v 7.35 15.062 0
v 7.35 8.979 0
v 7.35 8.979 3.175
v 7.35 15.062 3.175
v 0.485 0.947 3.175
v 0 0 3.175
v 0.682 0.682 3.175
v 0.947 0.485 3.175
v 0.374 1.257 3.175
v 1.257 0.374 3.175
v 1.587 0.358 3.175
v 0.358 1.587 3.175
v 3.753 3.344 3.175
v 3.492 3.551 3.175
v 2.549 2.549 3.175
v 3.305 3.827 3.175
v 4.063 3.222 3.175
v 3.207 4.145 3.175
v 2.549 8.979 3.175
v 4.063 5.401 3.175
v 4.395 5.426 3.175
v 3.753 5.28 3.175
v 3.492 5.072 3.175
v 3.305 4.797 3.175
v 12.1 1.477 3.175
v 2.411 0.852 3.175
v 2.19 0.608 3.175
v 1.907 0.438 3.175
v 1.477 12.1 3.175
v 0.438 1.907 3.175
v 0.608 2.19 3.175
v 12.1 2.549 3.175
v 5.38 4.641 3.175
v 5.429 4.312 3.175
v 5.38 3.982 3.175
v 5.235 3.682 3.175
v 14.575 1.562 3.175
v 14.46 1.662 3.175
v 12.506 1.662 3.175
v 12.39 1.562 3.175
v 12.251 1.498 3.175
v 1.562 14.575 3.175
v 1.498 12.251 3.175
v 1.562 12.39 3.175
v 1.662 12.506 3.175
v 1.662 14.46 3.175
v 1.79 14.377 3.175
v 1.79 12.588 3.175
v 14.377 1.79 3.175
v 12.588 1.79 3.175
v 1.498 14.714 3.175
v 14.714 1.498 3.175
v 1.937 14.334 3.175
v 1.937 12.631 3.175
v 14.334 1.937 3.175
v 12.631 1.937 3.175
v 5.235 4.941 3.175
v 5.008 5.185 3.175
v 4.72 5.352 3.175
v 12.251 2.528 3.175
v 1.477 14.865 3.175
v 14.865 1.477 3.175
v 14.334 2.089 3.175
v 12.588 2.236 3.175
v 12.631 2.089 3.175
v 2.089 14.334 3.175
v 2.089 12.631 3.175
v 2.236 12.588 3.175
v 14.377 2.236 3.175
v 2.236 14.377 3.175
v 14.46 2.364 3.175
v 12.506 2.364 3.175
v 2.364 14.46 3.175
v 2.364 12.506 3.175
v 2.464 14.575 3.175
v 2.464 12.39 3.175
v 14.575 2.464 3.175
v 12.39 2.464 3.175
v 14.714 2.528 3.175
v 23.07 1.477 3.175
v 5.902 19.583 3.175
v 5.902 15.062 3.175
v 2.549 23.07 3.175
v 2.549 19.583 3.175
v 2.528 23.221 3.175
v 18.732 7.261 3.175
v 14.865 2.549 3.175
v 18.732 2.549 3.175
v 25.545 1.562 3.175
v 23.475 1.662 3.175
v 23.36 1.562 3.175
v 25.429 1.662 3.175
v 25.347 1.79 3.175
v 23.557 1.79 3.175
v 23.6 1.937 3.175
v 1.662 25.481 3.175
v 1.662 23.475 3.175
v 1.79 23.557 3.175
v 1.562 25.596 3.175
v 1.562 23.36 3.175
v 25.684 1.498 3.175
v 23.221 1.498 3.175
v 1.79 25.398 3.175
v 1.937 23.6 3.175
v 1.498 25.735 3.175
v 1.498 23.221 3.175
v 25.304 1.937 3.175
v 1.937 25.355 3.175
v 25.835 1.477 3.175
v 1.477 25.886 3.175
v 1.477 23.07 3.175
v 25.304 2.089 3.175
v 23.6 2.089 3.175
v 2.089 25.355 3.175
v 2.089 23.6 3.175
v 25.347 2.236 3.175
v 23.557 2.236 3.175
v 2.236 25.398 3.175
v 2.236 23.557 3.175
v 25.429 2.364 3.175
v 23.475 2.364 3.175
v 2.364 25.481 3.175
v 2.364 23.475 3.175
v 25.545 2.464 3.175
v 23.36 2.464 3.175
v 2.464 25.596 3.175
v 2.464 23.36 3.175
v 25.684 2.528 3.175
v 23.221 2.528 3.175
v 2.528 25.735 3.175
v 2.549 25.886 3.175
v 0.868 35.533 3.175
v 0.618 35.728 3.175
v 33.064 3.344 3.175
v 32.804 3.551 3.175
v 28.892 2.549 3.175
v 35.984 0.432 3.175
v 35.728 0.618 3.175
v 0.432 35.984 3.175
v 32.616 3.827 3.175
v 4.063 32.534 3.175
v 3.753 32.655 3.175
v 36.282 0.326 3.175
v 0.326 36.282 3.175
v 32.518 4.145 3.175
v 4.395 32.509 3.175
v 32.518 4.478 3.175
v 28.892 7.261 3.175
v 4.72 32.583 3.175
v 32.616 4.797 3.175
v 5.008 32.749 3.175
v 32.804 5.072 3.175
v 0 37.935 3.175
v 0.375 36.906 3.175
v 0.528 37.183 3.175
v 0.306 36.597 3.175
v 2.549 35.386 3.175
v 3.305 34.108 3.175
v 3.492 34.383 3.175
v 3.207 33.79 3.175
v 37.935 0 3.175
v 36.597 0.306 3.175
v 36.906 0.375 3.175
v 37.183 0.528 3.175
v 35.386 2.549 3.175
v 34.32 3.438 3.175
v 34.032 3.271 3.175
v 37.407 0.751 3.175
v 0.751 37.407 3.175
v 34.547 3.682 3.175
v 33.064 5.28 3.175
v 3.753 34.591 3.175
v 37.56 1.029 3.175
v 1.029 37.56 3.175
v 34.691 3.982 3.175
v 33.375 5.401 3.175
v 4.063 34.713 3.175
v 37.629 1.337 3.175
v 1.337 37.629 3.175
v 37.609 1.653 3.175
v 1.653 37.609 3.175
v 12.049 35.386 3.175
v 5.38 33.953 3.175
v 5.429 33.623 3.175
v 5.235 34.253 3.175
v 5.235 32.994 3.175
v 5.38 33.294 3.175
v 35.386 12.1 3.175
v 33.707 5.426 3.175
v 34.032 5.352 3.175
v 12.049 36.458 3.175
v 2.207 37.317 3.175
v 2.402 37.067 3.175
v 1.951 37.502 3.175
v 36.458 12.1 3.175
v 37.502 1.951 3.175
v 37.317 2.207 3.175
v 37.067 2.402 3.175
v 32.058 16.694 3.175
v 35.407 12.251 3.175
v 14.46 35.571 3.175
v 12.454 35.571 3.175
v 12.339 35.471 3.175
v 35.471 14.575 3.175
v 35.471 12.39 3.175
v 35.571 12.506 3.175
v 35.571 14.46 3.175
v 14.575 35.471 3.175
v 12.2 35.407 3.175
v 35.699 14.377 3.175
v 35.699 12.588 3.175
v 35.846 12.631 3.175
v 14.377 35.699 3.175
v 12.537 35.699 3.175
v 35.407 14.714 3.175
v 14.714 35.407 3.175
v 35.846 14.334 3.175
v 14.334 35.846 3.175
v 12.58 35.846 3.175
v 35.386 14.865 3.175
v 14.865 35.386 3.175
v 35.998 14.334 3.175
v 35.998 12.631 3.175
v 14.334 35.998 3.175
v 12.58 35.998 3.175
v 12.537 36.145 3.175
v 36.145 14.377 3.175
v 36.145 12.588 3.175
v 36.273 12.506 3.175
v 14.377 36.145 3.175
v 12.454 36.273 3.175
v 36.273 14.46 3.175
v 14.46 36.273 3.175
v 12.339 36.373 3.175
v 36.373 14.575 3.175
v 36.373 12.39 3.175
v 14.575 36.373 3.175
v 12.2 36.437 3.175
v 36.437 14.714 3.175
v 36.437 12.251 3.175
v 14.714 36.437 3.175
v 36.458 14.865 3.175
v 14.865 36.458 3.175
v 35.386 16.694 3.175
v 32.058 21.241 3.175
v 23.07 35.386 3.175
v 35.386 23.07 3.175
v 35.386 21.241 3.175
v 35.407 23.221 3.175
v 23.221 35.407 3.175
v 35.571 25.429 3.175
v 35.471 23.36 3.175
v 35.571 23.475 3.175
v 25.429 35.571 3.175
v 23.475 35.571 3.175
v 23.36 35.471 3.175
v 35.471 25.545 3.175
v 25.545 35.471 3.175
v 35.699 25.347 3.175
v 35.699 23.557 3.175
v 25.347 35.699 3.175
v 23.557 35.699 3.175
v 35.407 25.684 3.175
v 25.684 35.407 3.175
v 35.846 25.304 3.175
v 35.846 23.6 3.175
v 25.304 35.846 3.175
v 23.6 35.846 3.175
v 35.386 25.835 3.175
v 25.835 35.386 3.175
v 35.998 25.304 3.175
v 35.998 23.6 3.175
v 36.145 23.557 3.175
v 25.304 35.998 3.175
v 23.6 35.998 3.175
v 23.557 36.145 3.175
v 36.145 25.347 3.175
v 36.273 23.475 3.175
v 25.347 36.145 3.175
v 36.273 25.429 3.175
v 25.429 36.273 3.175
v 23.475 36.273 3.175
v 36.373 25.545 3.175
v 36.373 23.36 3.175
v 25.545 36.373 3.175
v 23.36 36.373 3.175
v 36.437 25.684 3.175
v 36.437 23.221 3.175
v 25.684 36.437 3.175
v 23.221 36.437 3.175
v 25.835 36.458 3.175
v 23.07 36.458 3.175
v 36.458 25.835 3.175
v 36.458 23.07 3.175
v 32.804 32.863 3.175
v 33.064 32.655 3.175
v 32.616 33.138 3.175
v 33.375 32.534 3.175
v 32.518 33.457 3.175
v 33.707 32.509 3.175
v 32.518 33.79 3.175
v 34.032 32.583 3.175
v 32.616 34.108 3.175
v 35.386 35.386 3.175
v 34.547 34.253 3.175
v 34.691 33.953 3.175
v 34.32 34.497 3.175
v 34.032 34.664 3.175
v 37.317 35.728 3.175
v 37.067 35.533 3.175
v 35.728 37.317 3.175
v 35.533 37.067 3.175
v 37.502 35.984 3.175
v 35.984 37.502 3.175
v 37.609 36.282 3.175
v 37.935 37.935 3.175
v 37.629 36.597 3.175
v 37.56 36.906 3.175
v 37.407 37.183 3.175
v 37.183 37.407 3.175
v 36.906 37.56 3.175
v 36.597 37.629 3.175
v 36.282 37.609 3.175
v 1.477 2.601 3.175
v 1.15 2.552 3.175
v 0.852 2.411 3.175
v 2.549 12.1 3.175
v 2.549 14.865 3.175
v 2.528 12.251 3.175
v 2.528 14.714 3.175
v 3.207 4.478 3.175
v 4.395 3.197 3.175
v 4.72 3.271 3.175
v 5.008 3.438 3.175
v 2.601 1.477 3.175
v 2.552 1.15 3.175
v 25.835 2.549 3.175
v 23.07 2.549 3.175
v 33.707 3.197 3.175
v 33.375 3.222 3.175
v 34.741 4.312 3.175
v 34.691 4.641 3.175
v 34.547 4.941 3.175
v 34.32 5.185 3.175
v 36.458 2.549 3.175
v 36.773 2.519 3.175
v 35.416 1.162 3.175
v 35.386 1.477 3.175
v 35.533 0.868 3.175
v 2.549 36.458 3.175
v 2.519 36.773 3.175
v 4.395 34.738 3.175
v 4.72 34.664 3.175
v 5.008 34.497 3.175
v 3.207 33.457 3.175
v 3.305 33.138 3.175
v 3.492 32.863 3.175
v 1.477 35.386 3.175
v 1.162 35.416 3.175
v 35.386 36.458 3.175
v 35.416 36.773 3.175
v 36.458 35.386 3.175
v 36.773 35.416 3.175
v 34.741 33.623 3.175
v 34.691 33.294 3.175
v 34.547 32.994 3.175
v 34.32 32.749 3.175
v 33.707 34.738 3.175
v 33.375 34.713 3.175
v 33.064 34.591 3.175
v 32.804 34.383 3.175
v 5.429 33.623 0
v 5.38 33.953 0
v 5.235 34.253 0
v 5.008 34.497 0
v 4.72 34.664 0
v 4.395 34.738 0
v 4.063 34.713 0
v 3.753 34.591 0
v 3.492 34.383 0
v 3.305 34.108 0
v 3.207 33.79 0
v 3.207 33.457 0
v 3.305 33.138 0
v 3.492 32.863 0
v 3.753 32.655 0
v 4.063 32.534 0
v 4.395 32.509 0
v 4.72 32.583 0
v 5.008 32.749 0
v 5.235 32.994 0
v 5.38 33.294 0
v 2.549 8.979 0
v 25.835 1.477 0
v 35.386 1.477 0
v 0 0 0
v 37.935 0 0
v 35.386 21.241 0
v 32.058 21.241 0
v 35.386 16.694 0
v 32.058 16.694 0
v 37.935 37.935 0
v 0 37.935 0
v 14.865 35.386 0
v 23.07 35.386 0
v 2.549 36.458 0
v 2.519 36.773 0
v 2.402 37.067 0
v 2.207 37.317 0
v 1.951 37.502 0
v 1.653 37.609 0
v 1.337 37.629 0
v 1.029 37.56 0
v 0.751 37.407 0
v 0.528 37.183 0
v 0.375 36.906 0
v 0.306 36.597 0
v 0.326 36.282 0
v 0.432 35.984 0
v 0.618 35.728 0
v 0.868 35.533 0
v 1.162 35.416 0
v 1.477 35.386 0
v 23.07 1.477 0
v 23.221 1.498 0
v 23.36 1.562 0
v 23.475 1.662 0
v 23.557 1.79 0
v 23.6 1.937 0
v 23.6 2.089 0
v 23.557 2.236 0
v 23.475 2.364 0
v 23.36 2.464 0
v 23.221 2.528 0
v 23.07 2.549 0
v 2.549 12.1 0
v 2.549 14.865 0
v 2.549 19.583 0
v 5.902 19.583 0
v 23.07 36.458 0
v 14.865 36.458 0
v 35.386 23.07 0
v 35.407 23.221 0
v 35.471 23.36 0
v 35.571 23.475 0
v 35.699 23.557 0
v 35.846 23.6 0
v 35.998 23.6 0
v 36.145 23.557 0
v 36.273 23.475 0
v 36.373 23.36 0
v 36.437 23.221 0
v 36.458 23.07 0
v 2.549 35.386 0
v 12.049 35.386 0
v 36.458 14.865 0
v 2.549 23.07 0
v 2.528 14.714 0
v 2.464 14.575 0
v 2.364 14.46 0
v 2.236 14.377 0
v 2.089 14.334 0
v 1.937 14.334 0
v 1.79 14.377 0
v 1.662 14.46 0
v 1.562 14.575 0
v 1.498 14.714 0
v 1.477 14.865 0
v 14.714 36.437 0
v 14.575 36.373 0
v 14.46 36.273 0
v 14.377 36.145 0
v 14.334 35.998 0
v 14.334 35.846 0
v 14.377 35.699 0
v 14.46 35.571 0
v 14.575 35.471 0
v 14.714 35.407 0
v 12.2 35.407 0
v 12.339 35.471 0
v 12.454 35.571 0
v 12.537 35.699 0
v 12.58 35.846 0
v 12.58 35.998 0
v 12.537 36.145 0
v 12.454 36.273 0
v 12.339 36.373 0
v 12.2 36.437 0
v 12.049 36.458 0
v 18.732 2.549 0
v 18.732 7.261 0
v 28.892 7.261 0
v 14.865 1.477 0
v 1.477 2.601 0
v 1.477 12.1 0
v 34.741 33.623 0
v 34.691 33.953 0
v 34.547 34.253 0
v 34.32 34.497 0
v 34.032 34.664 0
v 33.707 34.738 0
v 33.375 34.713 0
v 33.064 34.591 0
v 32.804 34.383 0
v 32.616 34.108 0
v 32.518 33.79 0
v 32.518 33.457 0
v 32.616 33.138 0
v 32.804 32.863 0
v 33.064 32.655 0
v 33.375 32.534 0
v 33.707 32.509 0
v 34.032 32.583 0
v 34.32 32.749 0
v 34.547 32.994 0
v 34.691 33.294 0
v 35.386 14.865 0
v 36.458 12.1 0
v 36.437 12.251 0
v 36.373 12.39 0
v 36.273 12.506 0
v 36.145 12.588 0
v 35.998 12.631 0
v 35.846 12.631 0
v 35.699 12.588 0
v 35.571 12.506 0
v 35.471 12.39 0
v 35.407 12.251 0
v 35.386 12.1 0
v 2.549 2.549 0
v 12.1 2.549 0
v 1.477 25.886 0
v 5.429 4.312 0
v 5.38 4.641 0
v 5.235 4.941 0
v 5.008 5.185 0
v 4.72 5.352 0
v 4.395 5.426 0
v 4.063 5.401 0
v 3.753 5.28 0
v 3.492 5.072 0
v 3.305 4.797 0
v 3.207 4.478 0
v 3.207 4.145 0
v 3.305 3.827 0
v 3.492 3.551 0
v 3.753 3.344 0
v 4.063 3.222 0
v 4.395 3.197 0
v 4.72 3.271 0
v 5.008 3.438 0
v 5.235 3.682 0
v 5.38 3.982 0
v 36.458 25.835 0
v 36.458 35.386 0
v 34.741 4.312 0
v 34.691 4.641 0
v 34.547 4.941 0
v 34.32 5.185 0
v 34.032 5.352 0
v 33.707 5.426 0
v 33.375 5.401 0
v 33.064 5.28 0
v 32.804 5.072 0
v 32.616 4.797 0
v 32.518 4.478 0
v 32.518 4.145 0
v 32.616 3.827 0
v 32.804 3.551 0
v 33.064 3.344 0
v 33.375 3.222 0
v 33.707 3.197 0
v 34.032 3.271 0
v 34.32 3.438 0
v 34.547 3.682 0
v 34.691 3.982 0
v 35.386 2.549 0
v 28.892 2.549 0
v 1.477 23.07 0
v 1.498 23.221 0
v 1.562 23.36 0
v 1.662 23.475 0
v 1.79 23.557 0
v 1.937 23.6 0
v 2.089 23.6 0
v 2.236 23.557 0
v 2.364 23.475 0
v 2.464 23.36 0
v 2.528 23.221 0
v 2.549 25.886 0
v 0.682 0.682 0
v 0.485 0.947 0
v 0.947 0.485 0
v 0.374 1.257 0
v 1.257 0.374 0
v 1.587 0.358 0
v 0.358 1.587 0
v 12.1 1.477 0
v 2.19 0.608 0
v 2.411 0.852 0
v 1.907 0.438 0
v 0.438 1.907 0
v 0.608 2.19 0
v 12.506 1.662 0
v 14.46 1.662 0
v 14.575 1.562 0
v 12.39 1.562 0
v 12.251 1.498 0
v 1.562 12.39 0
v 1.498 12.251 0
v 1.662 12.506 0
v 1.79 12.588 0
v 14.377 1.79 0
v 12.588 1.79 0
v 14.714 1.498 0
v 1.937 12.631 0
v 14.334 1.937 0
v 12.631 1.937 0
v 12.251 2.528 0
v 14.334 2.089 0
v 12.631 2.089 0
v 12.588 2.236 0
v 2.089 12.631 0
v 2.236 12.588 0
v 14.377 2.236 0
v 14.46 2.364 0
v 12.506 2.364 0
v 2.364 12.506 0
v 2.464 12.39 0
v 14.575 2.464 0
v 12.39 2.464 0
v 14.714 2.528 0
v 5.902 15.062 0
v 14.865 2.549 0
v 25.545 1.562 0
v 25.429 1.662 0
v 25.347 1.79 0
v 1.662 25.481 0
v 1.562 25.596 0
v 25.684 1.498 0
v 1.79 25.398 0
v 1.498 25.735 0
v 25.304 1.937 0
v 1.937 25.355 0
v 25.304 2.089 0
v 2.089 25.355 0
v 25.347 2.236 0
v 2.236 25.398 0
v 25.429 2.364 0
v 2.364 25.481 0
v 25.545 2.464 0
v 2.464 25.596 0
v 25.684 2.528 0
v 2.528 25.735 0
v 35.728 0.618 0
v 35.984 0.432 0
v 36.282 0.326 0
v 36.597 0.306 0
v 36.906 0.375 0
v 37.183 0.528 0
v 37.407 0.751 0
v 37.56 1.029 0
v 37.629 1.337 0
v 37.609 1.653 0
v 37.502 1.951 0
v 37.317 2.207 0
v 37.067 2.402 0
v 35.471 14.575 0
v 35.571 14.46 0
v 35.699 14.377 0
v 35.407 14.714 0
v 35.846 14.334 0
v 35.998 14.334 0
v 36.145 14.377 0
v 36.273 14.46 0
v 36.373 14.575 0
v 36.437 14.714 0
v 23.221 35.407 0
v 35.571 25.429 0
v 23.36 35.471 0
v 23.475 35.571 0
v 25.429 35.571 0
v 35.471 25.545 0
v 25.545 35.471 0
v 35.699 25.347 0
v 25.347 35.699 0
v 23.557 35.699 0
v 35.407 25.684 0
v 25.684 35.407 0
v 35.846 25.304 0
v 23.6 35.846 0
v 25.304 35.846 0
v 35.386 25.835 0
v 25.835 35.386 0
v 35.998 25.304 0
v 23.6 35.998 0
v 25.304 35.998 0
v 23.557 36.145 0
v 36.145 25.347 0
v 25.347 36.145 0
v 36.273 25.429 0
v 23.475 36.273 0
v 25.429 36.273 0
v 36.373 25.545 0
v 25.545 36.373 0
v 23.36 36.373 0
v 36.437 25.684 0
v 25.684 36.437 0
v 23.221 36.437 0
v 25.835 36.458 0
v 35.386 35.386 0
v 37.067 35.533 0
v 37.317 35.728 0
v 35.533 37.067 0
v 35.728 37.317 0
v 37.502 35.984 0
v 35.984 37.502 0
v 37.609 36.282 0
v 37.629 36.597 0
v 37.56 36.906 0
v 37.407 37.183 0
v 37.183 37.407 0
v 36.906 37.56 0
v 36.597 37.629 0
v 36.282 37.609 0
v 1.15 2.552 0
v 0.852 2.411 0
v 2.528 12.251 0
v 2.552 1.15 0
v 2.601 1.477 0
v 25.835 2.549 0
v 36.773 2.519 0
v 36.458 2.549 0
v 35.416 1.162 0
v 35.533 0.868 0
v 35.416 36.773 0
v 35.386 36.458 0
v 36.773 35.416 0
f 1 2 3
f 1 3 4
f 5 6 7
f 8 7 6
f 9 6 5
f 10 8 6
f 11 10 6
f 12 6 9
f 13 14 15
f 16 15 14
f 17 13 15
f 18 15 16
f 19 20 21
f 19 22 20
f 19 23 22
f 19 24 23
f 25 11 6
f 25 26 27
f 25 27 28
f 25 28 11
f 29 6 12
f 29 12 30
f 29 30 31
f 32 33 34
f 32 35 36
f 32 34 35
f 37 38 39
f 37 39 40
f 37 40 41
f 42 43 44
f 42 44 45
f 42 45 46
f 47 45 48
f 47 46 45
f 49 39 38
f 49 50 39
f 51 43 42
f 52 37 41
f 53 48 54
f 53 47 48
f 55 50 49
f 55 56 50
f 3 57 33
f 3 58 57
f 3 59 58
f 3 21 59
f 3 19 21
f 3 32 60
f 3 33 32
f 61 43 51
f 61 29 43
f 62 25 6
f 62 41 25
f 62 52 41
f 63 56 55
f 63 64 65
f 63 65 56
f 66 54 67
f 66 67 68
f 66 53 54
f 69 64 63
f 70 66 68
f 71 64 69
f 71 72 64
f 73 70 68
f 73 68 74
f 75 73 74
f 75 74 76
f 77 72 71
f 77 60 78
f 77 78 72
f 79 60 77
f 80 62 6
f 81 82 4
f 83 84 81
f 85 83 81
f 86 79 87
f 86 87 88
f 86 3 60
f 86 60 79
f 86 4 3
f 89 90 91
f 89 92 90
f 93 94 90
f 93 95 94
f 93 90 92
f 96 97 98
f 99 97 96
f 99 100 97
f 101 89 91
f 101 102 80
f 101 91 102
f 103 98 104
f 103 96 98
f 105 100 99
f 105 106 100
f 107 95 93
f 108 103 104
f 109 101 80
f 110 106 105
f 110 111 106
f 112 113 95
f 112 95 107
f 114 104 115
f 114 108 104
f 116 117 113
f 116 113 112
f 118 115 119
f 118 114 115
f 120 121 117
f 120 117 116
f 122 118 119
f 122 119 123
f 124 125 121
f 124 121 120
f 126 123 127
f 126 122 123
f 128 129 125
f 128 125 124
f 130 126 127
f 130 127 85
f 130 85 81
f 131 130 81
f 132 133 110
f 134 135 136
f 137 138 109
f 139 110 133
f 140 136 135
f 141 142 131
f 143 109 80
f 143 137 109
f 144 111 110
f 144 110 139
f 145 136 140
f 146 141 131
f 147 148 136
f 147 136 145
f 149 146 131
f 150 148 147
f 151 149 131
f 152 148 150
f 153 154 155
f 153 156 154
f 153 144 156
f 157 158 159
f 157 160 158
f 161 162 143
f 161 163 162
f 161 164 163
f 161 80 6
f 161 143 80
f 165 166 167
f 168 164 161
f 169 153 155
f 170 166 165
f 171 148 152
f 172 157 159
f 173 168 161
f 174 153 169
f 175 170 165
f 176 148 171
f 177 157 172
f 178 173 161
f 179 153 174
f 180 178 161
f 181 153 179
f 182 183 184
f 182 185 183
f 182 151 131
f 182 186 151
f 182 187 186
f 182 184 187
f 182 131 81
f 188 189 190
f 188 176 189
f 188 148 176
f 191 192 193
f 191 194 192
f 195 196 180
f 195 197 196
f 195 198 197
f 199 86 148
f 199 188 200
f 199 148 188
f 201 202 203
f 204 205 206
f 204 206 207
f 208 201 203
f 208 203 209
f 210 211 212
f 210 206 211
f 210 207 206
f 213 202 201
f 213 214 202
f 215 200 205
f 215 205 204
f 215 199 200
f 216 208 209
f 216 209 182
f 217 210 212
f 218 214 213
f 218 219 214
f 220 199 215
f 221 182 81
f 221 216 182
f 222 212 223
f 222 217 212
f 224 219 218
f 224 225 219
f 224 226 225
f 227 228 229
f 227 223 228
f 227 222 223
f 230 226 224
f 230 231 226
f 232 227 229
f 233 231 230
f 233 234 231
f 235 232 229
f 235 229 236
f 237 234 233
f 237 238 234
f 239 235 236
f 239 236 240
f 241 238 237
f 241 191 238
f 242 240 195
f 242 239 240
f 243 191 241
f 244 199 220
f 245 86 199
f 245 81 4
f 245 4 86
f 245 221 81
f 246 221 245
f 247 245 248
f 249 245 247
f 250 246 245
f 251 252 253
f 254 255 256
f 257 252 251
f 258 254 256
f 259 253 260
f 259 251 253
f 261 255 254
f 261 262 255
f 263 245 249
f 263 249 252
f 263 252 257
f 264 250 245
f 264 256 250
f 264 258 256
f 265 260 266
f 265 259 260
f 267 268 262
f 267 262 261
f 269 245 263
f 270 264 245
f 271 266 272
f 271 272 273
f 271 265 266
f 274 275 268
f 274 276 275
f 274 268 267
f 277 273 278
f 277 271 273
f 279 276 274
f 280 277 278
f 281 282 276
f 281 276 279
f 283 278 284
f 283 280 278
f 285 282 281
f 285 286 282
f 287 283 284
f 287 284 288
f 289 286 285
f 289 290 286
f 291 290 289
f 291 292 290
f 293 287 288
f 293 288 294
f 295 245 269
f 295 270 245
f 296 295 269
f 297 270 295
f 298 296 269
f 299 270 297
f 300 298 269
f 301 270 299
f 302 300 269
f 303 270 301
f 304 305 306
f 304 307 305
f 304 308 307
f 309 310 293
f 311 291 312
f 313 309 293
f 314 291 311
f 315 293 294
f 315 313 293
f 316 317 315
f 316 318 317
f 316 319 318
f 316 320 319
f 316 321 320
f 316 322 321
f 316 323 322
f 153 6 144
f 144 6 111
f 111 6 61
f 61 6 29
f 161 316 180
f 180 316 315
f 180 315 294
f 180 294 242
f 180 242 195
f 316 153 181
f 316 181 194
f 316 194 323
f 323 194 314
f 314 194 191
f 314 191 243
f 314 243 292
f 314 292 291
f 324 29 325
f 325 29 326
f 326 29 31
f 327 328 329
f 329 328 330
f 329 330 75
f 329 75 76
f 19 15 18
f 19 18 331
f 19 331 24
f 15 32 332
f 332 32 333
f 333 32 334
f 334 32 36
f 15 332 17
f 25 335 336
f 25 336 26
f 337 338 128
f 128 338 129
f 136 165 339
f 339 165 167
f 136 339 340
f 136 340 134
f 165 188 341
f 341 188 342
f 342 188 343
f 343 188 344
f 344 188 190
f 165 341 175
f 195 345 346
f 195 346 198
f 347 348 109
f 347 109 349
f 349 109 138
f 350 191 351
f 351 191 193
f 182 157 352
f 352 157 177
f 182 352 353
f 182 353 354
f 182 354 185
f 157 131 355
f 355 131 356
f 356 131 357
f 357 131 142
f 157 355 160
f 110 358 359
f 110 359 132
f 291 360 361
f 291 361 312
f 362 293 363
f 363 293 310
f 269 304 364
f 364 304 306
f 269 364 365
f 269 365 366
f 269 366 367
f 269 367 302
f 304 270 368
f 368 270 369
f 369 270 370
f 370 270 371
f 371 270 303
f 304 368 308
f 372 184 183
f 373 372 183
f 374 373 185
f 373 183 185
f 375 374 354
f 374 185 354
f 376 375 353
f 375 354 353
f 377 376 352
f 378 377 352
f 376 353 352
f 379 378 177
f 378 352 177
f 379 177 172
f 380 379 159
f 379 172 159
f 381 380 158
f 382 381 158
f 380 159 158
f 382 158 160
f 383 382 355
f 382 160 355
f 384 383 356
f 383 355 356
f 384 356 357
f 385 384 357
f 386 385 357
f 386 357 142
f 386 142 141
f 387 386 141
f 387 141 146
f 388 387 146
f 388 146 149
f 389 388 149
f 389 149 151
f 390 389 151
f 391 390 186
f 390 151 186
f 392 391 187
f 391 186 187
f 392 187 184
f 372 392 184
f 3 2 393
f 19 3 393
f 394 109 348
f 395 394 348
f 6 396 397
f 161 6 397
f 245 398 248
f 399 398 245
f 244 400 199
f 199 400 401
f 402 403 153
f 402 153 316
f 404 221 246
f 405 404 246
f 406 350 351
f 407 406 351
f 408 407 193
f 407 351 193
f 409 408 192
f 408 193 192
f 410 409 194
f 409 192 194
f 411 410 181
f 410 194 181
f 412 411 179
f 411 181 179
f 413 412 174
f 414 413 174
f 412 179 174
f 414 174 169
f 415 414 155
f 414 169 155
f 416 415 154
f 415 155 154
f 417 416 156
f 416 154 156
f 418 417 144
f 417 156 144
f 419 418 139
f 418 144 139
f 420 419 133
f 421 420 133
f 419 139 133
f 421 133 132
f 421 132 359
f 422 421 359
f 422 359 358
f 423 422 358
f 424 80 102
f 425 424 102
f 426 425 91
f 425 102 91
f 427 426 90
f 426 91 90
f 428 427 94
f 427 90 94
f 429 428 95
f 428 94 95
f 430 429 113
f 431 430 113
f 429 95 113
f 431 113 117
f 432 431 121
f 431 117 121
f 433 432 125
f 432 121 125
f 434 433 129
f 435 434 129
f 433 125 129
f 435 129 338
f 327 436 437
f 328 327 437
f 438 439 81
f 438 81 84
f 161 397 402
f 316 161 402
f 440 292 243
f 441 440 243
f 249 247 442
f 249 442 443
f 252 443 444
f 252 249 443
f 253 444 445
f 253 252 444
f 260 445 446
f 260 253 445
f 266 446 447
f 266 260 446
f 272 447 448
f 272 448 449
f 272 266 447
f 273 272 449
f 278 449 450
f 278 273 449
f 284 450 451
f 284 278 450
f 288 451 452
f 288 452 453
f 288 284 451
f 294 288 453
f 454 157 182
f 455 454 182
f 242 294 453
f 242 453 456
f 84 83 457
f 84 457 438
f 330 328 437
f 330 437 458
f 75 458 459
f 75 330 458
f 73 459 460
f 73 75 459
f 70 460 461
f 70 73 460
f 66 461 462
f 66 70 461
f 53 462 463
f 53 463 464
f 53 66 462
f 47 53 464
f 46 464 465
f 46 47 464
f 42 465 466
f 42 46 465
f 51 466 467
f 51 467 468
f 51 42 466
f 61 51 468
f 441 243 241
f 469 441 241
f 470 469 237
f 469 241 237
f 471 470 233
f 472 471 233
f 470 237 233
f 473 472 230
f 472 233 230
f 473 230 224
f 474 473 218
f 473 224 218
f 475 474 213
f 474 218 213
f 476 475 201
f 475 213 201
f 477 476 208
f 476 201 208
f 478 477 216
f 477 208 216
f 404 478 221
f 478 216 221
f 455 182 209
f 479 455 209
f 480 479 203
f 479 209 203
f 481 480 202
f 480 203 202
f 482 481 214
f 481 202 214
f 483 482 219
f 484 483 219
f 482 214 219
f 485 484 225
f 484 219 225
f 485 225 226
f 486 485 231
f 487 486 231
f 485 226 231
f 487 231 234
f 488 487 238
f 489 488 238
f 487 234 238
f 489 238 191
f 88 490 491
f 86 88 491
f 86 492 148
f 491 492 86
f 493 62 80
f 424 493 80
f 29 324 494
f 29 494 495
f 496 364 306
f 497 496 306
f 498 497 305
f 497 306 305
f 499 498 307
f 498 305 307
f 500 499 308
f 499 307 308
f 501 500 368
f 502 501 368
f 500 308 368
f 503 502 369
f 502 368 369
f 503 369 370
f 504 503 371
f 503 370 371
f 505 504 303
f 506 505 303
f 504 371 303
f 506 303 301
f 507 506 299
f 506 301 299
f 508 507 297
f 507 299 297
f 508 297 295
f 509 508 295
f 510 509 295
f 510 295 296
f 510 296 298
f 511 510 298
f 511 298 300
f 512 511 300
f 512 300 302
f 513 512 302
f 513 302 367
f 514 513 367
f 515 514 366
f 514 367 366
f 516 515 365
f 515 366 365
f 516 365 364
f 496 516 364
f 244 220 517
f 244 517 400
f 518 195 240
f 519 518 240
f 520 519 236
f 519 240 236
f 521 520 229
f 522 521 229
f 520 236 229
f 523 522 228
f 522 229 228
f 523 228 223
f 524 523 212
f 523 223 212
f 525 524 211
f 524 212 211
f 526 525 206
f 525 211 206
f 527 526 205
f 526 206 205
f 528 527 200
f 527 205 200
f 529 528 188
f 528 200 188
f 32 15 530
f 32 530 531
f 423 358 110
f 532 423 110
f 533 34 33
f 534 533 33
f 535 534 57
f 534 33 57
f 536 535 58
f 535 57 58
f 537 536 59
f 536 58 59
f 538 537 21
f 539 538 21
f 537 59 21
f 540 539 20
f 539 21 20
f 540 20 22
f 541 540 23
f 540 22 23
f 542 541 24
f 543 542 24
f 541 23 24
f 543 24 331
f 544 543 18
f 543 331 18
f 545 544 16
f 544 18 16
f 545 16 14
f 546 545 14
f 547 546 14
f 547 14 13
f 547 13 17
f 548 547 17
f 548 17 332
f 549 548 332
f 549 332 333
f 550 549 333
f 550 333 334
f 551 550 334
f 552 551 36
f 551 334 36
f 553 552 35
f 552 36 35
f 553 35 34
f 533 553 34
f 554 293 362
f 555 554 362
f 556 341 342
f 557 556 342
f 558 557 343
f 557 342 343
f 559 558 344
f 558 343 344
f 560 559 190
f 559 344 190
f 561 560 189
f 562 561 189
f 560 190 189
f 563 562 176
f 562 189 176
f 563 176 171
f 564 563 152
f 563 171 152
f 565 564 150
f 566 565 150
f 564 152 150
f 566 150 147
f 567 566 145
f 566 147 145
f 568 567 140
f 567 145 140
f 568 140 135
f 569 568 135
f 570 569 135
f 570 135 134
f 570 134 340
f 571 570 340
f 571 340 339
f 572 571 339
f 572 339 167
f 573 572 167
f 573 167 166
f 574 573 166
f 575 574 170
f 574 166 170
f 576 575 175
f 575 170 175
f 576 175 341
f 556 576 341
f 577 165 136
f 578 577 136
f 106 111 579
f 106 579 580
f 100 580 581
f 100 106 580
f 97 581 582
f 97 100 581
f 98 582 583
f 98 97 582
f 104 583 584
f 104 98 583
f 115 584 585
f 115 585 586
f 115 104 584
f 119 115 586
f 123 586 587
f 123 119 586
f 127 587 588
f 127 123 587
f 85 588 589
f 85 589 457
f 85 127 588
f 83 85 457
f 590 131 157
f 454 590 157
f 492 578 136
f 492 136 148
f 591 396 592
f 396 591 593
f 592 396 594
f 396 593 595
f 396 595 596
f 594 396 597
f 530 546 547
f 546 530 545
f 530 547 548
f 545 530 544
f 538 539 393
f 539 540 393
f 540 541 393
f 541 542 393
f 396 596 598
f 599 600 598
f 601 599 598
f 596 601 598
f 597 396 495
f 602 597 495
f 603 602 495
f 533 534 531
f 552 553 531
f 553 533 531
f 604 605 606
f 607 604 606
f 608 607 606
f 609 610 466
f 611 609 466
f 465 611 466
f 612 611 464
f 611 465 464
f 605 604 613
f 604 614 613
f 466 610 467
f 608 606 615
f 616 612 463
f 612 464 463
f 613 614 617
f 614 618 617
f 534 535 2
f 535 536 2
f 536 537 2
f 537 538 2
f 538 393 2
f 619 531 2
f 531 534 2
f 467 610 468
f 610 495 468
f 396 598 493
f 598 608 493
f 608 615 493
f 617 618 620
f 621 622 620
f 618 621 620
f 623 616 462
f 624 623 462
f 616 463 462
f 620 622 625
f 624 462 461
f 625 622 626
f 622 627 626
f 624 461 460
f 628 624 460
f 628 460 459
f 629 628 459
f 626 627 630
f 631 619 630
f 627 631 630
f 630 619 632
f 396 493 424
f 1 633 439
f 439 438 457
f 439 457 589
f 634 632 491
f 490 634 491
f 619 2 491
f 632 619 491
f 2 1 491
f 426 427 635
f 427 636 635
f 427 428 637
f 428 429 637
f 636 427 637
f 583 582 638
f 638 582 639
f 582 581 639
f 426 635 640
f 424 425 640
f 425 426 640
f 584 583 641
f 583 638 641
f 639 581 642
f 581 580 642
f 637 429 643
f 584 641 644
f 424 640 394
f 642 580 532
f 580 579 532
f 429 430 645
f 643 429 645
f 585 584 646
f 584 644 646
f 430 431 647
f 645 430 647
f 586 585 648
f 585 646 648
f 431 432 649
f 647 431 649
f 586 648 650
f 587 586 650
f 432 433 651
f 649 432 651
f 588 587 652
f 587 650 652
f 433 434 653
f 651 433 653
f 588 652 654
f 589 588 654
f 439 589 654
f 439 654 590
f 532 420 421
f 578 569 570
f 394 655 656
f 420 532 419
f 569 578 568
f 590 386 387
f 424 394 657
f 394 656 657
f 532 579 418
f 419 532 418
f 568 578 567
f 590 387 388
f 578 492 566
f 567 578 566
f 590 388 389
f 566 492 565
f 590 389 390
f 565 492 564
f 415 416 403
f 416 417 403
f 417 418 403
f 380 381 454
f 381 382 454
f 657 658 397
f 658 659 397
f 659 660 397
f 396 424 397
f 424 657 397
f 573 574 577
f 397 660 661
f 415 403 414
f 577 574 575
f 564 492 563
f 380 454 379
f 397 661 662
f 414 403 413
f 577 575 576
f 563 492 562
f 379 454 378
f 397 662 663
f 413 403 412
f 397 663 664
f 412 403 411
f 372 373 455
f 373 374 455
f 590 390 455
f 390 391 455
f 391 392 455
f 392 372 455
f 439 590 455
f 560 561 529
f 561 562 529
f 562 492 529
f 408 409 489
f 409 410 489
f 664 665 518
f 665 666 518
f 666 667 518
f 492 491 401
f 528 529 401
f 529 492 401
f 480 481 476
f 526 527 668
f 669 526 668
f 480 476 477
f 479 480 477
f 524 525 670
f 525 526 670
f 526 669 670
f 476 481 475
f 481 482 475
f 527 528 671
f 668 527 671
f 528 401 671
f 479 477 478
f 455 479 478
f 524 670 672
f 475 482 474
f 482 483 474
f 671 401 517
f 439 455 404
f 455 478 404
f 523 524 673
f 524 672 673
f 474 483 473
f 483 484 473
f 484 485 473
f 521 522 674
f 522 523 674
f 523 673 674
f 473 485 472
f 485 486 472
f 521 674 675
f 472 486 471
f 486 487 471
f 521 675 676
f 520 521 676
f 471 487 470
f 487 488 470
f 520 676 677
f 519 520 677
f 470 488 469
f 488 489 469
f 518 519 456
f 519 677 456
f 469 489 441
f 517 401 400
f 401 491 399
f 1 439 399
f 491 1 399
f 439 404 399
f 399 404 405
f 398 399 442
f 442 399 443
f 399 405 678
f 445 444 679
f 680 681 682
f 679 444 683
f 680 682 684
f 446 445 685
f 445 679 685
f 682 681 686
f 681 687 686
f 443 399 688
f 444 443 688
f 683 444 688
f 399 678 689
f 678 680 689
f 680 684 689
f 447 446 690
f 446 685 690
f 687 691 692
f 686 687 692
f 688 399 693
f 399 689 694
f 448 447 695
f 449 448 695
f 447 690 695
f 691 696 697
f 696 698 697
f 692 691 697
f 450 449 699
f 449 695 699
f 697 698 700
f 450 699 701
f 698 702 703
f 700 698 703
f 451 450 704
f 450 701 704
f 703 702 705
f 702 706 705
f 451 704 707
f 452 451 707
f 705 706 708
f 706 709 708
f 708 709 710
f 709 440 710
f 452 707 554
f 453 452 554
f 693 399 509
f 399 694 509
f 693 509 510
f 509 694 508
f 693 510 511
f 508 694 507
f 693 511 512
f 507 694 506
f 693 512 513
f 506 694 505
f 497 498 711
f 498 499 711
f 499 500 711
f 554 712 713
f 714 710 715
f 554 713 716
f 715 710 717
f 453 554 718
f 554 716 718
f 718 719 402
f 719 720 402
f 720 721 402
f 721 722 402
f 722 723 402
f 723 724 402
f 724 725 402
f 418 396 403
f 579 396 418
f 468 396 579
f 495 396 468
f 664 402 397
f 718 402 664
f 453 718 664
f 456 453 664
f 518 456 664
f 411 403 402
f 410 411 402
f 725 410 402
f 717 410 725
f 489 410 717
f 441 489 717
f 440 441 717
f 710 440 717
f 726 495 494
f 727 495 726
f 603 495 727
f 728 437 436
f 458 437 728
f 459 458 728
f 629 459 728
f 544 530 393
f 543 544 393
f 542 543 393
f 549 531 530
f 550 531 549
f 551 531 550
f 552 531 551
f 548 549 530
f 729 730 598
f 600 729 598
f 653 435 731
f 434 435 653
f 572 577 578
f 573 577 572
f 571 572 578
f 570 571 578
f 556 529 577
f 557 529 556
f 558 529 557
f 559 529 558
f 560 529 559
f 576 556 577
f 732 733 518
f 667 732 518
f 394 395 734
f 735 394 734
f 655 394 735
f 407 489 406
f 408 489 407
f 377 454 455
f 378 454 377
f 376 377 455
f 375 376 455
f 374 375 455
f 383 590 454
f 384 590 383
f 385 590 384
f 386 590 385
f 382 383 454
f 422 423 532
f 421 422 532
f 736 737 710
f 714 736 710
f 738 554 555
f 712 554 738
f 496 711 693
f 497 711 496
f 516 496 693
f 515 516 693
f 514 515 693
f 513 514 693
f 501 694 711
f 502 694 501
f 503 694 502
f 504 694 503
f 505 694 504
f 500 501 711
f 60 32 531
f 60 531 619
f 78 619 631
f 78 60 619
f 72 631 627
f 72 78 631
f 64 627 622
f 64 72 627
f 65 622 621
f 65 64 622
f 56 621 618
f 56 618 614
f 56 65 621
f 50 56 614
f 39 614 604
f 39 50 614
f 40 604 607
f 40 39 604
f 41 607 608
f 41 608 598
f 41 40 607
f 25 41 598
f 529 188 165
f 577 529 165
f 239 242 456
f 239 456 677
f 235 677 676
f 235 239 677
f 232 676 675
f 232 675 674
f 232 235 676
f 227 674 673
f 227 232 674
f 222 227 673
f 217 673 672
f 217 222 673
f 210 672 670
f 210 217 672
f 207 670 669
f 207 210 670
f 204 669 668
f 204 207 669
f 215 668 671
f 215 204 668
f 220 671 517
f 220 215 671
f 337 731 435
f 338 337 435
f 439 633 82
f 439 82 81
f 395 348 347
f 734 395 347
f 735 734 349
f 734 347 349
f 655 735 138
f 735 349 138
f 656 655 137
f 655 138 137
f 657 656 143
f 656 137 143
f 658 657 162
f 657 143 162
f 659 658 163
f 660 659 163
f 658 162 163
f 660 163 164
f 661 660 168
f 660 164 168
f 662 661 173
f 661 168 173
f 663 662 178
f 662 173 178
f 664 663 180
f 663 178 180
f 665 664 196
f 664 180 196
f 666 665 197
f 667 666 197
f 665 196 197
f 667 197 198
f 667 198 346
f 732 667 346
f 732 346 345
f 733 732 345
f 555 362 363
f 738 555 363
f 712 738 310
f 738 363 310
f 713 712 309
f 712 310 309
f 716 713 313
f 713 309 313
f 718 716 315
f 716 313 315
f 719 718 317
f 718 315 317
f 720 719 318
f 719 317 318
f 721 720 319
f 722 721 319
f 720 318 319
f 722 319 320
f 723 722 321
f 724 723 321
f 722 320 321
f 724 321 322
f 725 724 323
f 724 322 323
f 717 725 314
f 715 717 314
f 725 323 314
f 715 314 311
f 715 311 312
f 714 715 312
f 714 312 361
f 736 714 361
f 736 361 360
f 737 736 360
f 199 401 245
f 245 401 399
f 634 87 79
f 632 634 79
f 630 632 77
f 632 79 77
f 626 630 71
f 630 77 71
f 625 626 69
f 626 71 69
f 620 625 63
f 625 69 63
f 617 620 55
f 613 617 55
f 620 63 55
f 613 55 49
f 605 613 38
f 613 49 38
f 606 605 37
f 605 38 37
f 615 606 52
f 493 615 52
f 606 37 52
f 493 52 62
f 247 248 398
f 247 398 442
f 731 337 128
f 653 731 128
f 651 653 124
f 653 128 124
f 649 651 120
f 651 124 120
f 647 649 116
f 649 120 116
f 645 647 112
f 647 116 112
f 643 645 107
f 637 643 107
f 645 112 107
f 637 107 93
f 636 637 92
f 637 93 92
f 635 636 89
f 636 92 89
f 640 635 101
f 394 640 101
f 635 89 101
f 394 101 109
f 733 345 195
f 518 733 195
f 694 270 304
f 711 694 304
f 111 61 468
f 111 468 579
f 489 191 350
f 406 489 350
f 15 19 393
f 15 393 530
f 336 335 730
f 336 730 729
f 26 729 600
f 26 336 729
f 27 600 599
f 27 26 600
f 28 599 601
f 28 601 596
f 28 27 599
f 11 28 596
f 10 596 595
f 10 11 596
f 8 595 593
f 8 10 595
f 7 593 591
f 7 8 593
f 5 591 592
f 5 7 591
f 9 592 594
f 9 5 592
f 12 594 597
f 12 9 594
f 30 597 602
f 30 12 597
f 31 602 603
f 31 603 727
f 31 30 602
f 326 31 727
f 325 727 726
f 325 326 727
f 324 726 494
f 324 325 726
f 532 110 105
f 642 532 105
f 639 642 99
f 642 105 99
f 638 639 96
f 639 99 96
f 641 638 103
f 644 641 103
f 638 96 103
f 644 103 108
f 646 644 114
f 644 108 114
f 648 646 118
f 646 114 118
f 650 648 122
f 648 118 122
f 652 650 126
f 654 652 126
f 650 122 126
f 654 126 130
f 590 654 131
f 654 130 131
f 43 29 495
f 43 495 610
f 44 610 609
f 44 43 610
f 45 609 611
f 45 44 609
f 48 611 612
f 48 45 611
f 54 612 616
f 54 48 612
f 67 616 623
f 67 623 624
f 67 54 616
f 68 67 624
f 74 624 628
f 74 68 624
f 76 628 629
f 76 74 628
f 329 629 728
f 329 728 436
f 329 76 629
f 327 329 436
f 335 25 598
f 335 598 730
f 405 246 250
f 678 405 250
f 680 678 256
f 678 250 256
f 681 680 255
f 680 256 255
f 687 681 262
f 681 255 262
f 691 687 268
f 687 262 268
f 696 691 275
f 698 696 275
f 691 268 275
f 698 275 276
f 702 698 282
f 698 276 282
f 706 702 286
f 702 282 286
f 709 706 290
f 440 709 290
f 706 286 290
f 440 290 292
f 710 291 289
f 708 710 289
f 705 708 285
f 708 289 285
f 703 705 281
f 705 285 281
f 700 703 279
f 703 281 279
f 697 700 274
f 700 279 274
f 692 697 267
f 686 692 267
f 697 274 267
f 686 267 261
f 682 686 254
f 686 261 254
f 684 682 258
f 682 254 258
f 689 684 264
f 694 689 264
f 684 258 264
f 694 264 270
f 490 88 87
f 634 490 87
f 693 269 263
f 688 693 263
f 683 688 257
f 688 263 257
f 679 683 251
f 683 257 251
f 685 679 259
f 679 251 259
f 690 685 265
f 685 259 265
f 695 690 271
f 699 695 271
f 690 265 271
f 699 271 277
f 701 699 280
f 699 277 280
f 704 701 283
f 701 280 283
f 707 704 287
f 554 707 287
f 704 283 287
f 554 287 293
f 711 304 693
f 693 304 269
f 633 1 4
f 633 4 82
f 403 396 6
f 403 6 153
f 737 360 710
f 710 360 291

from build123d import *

# Parameters (mm, degrees)
SKETCH1_W           = 37.9349
SKETCH1_H           = 37.9349
BOSS_EXTRUDE1_DEPTH = 3.175
SKETCH9_R           = 1.1176
CUT_EXTRUDE2_DEPTH  = 3.175
SKETCH12_W          = 3.3274
SKETCH12_H          = 4.5466
CUT_EXTRUDE4_DEPTH  = 3.175
SKETCH15_W          = 3.3528
SKETCH15_H          = 4.5212
CUT_EXTRUDE3_DEPTH  = 3.175
SKETCH13_W          = 10.16
SKETCH13_H          = 4.7117
CUT_EXTRUDE5_DEPTH  = 3.175
SKETCH14_W          = 4.8006
SKETCH14_H          = 6.0833
CUT_EXTRUDE6_DEPTH  = 3.175


with BuildPart() as part:
    # Sketch1 → Boss-Extrude1 (new body)
    with BuildSketch(Plane.XY):
        with Locations((18.96745, 18.96745)):
            Rectangle(SKETCH1_W, SKETCH1_H)
    extrude(amount=BOSS_EXTRUDE1_DEPTH)

    # Sketch9 → Cut-Extrude2 (cut)
    with BuildSketch(Plane.XY.offset(3.175)):
        with Locations((33.62325, 33.62325)):
            Circle(SKETCH9_R)
        with Locations((4.31165, 33.62325)):
            Circle(SKETCH9_R)
        with Locations((4.31165, 4.31165)):
            Circle(SKETCH9_R)
        with Locations((33.62325, 4.31165)):
            Circle(SKETCH9_R)
        with BuildLine():
            Line((35.385619933, 12.100169933), (35.385619933, 2.549280067))
            Line((35.385619933, 2.549280067), (25.834730067, 2.549280067))
            ThreePointArc((25.834730067, 2.549280067), (25.2984, 2.01295), (25.834730067, 1.476619933))
            Line((25.834730067, 1.476619933), (35.385619933, 1.476619933))
            ThreePointArc((35.385619933, 1.476619933), (37.303202335, 0.631697665), (36.458280067, 2.549280067))
            Line((36.458280067, 2.549280067), (36.458280067, 12.100169933))
            ThreePointArc((36.458280067, 12.100169933), (35.92195, 12.6365), (35.385619933, 12.100169933))
        make_face()
        with BuildLine():
            Line((35.385619933, 36.458280067), (25.834730067, 36.458280067))
            ThreePointArc((25.834730067, 36.458280067), (25.2984, 35.92195), (25.834730067, 35.385619933))
            Line((25.834730067, 35.385619933), (35.385619933, 35.385619933))
            Line((35.385619933, 35.385619933), (35.385619933, 25.834730067))
            ThreePointArc((35.385619933, 25.834730067), (35.92195, 25.2984), (36.458280067, 25.834730067))
            Line((36.458280067, 25.834730067), (36.458280067, 35.385619933))
            ThreePointArc((36.458280067, 35.385619933), (37.303202335, 37.303202335), (35.385619933, 36.458280067))
        make_face()
        with BuildLine():
            Line((12.048880067, 36.458280067), (2.549280067, 36.458280067))
            ThreePointArc((2.549280067, 36.458280067), (0.631697665, 37.303202335), (1.476619933, 35.385619933))
            Line((1.476619933, 35.385619933), (1.476619933, 25.886019933))
            ThreePointArc((1.476619933, 25.886019933), (2.01295, 25.349689867), (2.549280067, 25.886019933))
            Line((2.549280067, 25.886019933), (2.549280067, 35.385619933))
            Line((2.549280067, 35.385619933), (12.048880067, 35.385619933))
            ThreePointArc((12.048880067, 35.385619933), (12.585210133, 35.92195), (12.048880067, 36.458280067))
        make_face()
        with BuildLine():
            Line((23.06955, 36.458280067), (14.86535, 36.458280067))
            ThreePointArc((14.86535, 36.458280067), (14.329019933, 35.92195), (14.86535, 35.385619933))
            Line((14.86535, 35.385619933), (23.06955, 35.385619933))
            ThreePointArc((23.06955, 35.385619933), (23.605880067, 35.92195), (23.06955, 36.458280067))
        make_face()
        with BuildLine():
            Line((2.549280067, 23.06955), (2.549280067, 14.86535))
            ThreePointArc((2.549280067, 14.86535), (2.01295, 14.329019933), (1.476619933, 14.86535))
            Line((1.476619933, 14.86535), (1.476619933, 23.06955))
            ThreePointArc((1.476619933, 23.06955), (2.01295, 23.605880067), (2.549280067, 23.06955))
        make_face()
        with BuildLine():
            Line((36.458280067, 23.06955), (36.458280067, 14.86535))
            ThreePointArc((36.458280067, 14.86535), (35.92195, 14.329019933), (35.385619933, 14.86535))
            Line((35.385619933, 14.86535), (35.385619933, 23.06955))
            ThreePointArc((35.385619933, 23.06955), (35.92195, 23.605880067), (36.458280067, 23.06955))
        make_face()
        with BuildLine():
            Line((23.06955, 2.549280067), (14.86535, 2.549280067))
            ThreePointArc((14.86535, 2.549280067), (14.329019933, 2.01295), (14.86535, 1.476619933))
            Line((14.86535, 1.476619933), (23.06955, 1.476619933))
            ThreePointArc((23.06955, 1.476619933), (23.605880067, 2.01295), (23.06955, 2.549280067))
        make_face()
        with BuildLine():
            Line((2.549280067, 12.100169933), (2.549280067, 2.549280067))
            Line((2.549280067, 2.549280067), (12.100169933, 2.549280067))
            ThreePointArc((12.100169933, 2.549280067), (12.6365, 2.01295), (12.100169933, 1.476619933))
            Line((12.100169933, 1.476619933), (2.600569933, 1.476619933))
            ThreePointArc((2.600569933, 1.476619933), (0.681867267, 0.681867267), (1.476619933, 2.600569933))
            Line((1.476619933, 2.600569933), (1.476619933, 12.100169933))
            ThreePointArc((1.476619933, 12.100169933), (2.01295, 12.6365), (2.549280067, 12.100169933))
        make_face()
    extrude(amount=-CUT_EXTRUDE2_DEPTH, mode=Mode.SUBTRACT)

    # Sketch12 → Cut-Extrude4 (cut)
    with BuildSketch(Plane(origin=(0, 0, 0), x_dir=(-1, 0, 0), z_dir=(0, 0, -1))):
        with Locations((-33.721919933, 18.96745)):
            Rectangle(SKETCH12_W, SKETCH12_H)
    extrude(amount=-CUT_EXTRUDE4_DEPTH, mode=Mode.SUBTRACT)

    # Sketch15 → Cut-Extrude3 (cut)
    with BuildSketch(Plane(origin=(0, 0, 0), x_dir=(-1, 0, 0), z_dir=(0, 0, -1))):
        with Locations((-4.225680067, 17.3228)):
            Rectangle(SKETCH15_W, SKETCH15_H)
    extrude(amount=-CUT_EXTRUDE3_DEPTH, mode=Mode.SUBTRACT)

    # Sketch13 → Cut-Extrude5 (cut)
    with BuildSketch(Plane(origin=(0, 0, 0), x_dir=(-1, 0, 0), z_dir=(0, 0, -1))):
        with Locations((-23.8125, 4.905130067)):
            Rectangle(SKETCH13_W, SKETCH13_H)
    extrude(amount=-CUT_EXTRUDE5_DEPTH, mode=Mode.SUBTRACT)

    # Sketch14 → Cut-Extrude6 (cut)
    with BuildSketch(Plane(origin=(0, 0, 0), x_dir=(-1, 0, 0), z_dir=(0, 0, -1))):
        with Locations((-4.949580067, 12.02055)):
            Rectangle(SKETCH14_W, SKETCH14_H)
    extrude(amount=-CUT_EXTRUDE6_DEPTH, mode=Mode.SUBTRACT)


solid = part.part
